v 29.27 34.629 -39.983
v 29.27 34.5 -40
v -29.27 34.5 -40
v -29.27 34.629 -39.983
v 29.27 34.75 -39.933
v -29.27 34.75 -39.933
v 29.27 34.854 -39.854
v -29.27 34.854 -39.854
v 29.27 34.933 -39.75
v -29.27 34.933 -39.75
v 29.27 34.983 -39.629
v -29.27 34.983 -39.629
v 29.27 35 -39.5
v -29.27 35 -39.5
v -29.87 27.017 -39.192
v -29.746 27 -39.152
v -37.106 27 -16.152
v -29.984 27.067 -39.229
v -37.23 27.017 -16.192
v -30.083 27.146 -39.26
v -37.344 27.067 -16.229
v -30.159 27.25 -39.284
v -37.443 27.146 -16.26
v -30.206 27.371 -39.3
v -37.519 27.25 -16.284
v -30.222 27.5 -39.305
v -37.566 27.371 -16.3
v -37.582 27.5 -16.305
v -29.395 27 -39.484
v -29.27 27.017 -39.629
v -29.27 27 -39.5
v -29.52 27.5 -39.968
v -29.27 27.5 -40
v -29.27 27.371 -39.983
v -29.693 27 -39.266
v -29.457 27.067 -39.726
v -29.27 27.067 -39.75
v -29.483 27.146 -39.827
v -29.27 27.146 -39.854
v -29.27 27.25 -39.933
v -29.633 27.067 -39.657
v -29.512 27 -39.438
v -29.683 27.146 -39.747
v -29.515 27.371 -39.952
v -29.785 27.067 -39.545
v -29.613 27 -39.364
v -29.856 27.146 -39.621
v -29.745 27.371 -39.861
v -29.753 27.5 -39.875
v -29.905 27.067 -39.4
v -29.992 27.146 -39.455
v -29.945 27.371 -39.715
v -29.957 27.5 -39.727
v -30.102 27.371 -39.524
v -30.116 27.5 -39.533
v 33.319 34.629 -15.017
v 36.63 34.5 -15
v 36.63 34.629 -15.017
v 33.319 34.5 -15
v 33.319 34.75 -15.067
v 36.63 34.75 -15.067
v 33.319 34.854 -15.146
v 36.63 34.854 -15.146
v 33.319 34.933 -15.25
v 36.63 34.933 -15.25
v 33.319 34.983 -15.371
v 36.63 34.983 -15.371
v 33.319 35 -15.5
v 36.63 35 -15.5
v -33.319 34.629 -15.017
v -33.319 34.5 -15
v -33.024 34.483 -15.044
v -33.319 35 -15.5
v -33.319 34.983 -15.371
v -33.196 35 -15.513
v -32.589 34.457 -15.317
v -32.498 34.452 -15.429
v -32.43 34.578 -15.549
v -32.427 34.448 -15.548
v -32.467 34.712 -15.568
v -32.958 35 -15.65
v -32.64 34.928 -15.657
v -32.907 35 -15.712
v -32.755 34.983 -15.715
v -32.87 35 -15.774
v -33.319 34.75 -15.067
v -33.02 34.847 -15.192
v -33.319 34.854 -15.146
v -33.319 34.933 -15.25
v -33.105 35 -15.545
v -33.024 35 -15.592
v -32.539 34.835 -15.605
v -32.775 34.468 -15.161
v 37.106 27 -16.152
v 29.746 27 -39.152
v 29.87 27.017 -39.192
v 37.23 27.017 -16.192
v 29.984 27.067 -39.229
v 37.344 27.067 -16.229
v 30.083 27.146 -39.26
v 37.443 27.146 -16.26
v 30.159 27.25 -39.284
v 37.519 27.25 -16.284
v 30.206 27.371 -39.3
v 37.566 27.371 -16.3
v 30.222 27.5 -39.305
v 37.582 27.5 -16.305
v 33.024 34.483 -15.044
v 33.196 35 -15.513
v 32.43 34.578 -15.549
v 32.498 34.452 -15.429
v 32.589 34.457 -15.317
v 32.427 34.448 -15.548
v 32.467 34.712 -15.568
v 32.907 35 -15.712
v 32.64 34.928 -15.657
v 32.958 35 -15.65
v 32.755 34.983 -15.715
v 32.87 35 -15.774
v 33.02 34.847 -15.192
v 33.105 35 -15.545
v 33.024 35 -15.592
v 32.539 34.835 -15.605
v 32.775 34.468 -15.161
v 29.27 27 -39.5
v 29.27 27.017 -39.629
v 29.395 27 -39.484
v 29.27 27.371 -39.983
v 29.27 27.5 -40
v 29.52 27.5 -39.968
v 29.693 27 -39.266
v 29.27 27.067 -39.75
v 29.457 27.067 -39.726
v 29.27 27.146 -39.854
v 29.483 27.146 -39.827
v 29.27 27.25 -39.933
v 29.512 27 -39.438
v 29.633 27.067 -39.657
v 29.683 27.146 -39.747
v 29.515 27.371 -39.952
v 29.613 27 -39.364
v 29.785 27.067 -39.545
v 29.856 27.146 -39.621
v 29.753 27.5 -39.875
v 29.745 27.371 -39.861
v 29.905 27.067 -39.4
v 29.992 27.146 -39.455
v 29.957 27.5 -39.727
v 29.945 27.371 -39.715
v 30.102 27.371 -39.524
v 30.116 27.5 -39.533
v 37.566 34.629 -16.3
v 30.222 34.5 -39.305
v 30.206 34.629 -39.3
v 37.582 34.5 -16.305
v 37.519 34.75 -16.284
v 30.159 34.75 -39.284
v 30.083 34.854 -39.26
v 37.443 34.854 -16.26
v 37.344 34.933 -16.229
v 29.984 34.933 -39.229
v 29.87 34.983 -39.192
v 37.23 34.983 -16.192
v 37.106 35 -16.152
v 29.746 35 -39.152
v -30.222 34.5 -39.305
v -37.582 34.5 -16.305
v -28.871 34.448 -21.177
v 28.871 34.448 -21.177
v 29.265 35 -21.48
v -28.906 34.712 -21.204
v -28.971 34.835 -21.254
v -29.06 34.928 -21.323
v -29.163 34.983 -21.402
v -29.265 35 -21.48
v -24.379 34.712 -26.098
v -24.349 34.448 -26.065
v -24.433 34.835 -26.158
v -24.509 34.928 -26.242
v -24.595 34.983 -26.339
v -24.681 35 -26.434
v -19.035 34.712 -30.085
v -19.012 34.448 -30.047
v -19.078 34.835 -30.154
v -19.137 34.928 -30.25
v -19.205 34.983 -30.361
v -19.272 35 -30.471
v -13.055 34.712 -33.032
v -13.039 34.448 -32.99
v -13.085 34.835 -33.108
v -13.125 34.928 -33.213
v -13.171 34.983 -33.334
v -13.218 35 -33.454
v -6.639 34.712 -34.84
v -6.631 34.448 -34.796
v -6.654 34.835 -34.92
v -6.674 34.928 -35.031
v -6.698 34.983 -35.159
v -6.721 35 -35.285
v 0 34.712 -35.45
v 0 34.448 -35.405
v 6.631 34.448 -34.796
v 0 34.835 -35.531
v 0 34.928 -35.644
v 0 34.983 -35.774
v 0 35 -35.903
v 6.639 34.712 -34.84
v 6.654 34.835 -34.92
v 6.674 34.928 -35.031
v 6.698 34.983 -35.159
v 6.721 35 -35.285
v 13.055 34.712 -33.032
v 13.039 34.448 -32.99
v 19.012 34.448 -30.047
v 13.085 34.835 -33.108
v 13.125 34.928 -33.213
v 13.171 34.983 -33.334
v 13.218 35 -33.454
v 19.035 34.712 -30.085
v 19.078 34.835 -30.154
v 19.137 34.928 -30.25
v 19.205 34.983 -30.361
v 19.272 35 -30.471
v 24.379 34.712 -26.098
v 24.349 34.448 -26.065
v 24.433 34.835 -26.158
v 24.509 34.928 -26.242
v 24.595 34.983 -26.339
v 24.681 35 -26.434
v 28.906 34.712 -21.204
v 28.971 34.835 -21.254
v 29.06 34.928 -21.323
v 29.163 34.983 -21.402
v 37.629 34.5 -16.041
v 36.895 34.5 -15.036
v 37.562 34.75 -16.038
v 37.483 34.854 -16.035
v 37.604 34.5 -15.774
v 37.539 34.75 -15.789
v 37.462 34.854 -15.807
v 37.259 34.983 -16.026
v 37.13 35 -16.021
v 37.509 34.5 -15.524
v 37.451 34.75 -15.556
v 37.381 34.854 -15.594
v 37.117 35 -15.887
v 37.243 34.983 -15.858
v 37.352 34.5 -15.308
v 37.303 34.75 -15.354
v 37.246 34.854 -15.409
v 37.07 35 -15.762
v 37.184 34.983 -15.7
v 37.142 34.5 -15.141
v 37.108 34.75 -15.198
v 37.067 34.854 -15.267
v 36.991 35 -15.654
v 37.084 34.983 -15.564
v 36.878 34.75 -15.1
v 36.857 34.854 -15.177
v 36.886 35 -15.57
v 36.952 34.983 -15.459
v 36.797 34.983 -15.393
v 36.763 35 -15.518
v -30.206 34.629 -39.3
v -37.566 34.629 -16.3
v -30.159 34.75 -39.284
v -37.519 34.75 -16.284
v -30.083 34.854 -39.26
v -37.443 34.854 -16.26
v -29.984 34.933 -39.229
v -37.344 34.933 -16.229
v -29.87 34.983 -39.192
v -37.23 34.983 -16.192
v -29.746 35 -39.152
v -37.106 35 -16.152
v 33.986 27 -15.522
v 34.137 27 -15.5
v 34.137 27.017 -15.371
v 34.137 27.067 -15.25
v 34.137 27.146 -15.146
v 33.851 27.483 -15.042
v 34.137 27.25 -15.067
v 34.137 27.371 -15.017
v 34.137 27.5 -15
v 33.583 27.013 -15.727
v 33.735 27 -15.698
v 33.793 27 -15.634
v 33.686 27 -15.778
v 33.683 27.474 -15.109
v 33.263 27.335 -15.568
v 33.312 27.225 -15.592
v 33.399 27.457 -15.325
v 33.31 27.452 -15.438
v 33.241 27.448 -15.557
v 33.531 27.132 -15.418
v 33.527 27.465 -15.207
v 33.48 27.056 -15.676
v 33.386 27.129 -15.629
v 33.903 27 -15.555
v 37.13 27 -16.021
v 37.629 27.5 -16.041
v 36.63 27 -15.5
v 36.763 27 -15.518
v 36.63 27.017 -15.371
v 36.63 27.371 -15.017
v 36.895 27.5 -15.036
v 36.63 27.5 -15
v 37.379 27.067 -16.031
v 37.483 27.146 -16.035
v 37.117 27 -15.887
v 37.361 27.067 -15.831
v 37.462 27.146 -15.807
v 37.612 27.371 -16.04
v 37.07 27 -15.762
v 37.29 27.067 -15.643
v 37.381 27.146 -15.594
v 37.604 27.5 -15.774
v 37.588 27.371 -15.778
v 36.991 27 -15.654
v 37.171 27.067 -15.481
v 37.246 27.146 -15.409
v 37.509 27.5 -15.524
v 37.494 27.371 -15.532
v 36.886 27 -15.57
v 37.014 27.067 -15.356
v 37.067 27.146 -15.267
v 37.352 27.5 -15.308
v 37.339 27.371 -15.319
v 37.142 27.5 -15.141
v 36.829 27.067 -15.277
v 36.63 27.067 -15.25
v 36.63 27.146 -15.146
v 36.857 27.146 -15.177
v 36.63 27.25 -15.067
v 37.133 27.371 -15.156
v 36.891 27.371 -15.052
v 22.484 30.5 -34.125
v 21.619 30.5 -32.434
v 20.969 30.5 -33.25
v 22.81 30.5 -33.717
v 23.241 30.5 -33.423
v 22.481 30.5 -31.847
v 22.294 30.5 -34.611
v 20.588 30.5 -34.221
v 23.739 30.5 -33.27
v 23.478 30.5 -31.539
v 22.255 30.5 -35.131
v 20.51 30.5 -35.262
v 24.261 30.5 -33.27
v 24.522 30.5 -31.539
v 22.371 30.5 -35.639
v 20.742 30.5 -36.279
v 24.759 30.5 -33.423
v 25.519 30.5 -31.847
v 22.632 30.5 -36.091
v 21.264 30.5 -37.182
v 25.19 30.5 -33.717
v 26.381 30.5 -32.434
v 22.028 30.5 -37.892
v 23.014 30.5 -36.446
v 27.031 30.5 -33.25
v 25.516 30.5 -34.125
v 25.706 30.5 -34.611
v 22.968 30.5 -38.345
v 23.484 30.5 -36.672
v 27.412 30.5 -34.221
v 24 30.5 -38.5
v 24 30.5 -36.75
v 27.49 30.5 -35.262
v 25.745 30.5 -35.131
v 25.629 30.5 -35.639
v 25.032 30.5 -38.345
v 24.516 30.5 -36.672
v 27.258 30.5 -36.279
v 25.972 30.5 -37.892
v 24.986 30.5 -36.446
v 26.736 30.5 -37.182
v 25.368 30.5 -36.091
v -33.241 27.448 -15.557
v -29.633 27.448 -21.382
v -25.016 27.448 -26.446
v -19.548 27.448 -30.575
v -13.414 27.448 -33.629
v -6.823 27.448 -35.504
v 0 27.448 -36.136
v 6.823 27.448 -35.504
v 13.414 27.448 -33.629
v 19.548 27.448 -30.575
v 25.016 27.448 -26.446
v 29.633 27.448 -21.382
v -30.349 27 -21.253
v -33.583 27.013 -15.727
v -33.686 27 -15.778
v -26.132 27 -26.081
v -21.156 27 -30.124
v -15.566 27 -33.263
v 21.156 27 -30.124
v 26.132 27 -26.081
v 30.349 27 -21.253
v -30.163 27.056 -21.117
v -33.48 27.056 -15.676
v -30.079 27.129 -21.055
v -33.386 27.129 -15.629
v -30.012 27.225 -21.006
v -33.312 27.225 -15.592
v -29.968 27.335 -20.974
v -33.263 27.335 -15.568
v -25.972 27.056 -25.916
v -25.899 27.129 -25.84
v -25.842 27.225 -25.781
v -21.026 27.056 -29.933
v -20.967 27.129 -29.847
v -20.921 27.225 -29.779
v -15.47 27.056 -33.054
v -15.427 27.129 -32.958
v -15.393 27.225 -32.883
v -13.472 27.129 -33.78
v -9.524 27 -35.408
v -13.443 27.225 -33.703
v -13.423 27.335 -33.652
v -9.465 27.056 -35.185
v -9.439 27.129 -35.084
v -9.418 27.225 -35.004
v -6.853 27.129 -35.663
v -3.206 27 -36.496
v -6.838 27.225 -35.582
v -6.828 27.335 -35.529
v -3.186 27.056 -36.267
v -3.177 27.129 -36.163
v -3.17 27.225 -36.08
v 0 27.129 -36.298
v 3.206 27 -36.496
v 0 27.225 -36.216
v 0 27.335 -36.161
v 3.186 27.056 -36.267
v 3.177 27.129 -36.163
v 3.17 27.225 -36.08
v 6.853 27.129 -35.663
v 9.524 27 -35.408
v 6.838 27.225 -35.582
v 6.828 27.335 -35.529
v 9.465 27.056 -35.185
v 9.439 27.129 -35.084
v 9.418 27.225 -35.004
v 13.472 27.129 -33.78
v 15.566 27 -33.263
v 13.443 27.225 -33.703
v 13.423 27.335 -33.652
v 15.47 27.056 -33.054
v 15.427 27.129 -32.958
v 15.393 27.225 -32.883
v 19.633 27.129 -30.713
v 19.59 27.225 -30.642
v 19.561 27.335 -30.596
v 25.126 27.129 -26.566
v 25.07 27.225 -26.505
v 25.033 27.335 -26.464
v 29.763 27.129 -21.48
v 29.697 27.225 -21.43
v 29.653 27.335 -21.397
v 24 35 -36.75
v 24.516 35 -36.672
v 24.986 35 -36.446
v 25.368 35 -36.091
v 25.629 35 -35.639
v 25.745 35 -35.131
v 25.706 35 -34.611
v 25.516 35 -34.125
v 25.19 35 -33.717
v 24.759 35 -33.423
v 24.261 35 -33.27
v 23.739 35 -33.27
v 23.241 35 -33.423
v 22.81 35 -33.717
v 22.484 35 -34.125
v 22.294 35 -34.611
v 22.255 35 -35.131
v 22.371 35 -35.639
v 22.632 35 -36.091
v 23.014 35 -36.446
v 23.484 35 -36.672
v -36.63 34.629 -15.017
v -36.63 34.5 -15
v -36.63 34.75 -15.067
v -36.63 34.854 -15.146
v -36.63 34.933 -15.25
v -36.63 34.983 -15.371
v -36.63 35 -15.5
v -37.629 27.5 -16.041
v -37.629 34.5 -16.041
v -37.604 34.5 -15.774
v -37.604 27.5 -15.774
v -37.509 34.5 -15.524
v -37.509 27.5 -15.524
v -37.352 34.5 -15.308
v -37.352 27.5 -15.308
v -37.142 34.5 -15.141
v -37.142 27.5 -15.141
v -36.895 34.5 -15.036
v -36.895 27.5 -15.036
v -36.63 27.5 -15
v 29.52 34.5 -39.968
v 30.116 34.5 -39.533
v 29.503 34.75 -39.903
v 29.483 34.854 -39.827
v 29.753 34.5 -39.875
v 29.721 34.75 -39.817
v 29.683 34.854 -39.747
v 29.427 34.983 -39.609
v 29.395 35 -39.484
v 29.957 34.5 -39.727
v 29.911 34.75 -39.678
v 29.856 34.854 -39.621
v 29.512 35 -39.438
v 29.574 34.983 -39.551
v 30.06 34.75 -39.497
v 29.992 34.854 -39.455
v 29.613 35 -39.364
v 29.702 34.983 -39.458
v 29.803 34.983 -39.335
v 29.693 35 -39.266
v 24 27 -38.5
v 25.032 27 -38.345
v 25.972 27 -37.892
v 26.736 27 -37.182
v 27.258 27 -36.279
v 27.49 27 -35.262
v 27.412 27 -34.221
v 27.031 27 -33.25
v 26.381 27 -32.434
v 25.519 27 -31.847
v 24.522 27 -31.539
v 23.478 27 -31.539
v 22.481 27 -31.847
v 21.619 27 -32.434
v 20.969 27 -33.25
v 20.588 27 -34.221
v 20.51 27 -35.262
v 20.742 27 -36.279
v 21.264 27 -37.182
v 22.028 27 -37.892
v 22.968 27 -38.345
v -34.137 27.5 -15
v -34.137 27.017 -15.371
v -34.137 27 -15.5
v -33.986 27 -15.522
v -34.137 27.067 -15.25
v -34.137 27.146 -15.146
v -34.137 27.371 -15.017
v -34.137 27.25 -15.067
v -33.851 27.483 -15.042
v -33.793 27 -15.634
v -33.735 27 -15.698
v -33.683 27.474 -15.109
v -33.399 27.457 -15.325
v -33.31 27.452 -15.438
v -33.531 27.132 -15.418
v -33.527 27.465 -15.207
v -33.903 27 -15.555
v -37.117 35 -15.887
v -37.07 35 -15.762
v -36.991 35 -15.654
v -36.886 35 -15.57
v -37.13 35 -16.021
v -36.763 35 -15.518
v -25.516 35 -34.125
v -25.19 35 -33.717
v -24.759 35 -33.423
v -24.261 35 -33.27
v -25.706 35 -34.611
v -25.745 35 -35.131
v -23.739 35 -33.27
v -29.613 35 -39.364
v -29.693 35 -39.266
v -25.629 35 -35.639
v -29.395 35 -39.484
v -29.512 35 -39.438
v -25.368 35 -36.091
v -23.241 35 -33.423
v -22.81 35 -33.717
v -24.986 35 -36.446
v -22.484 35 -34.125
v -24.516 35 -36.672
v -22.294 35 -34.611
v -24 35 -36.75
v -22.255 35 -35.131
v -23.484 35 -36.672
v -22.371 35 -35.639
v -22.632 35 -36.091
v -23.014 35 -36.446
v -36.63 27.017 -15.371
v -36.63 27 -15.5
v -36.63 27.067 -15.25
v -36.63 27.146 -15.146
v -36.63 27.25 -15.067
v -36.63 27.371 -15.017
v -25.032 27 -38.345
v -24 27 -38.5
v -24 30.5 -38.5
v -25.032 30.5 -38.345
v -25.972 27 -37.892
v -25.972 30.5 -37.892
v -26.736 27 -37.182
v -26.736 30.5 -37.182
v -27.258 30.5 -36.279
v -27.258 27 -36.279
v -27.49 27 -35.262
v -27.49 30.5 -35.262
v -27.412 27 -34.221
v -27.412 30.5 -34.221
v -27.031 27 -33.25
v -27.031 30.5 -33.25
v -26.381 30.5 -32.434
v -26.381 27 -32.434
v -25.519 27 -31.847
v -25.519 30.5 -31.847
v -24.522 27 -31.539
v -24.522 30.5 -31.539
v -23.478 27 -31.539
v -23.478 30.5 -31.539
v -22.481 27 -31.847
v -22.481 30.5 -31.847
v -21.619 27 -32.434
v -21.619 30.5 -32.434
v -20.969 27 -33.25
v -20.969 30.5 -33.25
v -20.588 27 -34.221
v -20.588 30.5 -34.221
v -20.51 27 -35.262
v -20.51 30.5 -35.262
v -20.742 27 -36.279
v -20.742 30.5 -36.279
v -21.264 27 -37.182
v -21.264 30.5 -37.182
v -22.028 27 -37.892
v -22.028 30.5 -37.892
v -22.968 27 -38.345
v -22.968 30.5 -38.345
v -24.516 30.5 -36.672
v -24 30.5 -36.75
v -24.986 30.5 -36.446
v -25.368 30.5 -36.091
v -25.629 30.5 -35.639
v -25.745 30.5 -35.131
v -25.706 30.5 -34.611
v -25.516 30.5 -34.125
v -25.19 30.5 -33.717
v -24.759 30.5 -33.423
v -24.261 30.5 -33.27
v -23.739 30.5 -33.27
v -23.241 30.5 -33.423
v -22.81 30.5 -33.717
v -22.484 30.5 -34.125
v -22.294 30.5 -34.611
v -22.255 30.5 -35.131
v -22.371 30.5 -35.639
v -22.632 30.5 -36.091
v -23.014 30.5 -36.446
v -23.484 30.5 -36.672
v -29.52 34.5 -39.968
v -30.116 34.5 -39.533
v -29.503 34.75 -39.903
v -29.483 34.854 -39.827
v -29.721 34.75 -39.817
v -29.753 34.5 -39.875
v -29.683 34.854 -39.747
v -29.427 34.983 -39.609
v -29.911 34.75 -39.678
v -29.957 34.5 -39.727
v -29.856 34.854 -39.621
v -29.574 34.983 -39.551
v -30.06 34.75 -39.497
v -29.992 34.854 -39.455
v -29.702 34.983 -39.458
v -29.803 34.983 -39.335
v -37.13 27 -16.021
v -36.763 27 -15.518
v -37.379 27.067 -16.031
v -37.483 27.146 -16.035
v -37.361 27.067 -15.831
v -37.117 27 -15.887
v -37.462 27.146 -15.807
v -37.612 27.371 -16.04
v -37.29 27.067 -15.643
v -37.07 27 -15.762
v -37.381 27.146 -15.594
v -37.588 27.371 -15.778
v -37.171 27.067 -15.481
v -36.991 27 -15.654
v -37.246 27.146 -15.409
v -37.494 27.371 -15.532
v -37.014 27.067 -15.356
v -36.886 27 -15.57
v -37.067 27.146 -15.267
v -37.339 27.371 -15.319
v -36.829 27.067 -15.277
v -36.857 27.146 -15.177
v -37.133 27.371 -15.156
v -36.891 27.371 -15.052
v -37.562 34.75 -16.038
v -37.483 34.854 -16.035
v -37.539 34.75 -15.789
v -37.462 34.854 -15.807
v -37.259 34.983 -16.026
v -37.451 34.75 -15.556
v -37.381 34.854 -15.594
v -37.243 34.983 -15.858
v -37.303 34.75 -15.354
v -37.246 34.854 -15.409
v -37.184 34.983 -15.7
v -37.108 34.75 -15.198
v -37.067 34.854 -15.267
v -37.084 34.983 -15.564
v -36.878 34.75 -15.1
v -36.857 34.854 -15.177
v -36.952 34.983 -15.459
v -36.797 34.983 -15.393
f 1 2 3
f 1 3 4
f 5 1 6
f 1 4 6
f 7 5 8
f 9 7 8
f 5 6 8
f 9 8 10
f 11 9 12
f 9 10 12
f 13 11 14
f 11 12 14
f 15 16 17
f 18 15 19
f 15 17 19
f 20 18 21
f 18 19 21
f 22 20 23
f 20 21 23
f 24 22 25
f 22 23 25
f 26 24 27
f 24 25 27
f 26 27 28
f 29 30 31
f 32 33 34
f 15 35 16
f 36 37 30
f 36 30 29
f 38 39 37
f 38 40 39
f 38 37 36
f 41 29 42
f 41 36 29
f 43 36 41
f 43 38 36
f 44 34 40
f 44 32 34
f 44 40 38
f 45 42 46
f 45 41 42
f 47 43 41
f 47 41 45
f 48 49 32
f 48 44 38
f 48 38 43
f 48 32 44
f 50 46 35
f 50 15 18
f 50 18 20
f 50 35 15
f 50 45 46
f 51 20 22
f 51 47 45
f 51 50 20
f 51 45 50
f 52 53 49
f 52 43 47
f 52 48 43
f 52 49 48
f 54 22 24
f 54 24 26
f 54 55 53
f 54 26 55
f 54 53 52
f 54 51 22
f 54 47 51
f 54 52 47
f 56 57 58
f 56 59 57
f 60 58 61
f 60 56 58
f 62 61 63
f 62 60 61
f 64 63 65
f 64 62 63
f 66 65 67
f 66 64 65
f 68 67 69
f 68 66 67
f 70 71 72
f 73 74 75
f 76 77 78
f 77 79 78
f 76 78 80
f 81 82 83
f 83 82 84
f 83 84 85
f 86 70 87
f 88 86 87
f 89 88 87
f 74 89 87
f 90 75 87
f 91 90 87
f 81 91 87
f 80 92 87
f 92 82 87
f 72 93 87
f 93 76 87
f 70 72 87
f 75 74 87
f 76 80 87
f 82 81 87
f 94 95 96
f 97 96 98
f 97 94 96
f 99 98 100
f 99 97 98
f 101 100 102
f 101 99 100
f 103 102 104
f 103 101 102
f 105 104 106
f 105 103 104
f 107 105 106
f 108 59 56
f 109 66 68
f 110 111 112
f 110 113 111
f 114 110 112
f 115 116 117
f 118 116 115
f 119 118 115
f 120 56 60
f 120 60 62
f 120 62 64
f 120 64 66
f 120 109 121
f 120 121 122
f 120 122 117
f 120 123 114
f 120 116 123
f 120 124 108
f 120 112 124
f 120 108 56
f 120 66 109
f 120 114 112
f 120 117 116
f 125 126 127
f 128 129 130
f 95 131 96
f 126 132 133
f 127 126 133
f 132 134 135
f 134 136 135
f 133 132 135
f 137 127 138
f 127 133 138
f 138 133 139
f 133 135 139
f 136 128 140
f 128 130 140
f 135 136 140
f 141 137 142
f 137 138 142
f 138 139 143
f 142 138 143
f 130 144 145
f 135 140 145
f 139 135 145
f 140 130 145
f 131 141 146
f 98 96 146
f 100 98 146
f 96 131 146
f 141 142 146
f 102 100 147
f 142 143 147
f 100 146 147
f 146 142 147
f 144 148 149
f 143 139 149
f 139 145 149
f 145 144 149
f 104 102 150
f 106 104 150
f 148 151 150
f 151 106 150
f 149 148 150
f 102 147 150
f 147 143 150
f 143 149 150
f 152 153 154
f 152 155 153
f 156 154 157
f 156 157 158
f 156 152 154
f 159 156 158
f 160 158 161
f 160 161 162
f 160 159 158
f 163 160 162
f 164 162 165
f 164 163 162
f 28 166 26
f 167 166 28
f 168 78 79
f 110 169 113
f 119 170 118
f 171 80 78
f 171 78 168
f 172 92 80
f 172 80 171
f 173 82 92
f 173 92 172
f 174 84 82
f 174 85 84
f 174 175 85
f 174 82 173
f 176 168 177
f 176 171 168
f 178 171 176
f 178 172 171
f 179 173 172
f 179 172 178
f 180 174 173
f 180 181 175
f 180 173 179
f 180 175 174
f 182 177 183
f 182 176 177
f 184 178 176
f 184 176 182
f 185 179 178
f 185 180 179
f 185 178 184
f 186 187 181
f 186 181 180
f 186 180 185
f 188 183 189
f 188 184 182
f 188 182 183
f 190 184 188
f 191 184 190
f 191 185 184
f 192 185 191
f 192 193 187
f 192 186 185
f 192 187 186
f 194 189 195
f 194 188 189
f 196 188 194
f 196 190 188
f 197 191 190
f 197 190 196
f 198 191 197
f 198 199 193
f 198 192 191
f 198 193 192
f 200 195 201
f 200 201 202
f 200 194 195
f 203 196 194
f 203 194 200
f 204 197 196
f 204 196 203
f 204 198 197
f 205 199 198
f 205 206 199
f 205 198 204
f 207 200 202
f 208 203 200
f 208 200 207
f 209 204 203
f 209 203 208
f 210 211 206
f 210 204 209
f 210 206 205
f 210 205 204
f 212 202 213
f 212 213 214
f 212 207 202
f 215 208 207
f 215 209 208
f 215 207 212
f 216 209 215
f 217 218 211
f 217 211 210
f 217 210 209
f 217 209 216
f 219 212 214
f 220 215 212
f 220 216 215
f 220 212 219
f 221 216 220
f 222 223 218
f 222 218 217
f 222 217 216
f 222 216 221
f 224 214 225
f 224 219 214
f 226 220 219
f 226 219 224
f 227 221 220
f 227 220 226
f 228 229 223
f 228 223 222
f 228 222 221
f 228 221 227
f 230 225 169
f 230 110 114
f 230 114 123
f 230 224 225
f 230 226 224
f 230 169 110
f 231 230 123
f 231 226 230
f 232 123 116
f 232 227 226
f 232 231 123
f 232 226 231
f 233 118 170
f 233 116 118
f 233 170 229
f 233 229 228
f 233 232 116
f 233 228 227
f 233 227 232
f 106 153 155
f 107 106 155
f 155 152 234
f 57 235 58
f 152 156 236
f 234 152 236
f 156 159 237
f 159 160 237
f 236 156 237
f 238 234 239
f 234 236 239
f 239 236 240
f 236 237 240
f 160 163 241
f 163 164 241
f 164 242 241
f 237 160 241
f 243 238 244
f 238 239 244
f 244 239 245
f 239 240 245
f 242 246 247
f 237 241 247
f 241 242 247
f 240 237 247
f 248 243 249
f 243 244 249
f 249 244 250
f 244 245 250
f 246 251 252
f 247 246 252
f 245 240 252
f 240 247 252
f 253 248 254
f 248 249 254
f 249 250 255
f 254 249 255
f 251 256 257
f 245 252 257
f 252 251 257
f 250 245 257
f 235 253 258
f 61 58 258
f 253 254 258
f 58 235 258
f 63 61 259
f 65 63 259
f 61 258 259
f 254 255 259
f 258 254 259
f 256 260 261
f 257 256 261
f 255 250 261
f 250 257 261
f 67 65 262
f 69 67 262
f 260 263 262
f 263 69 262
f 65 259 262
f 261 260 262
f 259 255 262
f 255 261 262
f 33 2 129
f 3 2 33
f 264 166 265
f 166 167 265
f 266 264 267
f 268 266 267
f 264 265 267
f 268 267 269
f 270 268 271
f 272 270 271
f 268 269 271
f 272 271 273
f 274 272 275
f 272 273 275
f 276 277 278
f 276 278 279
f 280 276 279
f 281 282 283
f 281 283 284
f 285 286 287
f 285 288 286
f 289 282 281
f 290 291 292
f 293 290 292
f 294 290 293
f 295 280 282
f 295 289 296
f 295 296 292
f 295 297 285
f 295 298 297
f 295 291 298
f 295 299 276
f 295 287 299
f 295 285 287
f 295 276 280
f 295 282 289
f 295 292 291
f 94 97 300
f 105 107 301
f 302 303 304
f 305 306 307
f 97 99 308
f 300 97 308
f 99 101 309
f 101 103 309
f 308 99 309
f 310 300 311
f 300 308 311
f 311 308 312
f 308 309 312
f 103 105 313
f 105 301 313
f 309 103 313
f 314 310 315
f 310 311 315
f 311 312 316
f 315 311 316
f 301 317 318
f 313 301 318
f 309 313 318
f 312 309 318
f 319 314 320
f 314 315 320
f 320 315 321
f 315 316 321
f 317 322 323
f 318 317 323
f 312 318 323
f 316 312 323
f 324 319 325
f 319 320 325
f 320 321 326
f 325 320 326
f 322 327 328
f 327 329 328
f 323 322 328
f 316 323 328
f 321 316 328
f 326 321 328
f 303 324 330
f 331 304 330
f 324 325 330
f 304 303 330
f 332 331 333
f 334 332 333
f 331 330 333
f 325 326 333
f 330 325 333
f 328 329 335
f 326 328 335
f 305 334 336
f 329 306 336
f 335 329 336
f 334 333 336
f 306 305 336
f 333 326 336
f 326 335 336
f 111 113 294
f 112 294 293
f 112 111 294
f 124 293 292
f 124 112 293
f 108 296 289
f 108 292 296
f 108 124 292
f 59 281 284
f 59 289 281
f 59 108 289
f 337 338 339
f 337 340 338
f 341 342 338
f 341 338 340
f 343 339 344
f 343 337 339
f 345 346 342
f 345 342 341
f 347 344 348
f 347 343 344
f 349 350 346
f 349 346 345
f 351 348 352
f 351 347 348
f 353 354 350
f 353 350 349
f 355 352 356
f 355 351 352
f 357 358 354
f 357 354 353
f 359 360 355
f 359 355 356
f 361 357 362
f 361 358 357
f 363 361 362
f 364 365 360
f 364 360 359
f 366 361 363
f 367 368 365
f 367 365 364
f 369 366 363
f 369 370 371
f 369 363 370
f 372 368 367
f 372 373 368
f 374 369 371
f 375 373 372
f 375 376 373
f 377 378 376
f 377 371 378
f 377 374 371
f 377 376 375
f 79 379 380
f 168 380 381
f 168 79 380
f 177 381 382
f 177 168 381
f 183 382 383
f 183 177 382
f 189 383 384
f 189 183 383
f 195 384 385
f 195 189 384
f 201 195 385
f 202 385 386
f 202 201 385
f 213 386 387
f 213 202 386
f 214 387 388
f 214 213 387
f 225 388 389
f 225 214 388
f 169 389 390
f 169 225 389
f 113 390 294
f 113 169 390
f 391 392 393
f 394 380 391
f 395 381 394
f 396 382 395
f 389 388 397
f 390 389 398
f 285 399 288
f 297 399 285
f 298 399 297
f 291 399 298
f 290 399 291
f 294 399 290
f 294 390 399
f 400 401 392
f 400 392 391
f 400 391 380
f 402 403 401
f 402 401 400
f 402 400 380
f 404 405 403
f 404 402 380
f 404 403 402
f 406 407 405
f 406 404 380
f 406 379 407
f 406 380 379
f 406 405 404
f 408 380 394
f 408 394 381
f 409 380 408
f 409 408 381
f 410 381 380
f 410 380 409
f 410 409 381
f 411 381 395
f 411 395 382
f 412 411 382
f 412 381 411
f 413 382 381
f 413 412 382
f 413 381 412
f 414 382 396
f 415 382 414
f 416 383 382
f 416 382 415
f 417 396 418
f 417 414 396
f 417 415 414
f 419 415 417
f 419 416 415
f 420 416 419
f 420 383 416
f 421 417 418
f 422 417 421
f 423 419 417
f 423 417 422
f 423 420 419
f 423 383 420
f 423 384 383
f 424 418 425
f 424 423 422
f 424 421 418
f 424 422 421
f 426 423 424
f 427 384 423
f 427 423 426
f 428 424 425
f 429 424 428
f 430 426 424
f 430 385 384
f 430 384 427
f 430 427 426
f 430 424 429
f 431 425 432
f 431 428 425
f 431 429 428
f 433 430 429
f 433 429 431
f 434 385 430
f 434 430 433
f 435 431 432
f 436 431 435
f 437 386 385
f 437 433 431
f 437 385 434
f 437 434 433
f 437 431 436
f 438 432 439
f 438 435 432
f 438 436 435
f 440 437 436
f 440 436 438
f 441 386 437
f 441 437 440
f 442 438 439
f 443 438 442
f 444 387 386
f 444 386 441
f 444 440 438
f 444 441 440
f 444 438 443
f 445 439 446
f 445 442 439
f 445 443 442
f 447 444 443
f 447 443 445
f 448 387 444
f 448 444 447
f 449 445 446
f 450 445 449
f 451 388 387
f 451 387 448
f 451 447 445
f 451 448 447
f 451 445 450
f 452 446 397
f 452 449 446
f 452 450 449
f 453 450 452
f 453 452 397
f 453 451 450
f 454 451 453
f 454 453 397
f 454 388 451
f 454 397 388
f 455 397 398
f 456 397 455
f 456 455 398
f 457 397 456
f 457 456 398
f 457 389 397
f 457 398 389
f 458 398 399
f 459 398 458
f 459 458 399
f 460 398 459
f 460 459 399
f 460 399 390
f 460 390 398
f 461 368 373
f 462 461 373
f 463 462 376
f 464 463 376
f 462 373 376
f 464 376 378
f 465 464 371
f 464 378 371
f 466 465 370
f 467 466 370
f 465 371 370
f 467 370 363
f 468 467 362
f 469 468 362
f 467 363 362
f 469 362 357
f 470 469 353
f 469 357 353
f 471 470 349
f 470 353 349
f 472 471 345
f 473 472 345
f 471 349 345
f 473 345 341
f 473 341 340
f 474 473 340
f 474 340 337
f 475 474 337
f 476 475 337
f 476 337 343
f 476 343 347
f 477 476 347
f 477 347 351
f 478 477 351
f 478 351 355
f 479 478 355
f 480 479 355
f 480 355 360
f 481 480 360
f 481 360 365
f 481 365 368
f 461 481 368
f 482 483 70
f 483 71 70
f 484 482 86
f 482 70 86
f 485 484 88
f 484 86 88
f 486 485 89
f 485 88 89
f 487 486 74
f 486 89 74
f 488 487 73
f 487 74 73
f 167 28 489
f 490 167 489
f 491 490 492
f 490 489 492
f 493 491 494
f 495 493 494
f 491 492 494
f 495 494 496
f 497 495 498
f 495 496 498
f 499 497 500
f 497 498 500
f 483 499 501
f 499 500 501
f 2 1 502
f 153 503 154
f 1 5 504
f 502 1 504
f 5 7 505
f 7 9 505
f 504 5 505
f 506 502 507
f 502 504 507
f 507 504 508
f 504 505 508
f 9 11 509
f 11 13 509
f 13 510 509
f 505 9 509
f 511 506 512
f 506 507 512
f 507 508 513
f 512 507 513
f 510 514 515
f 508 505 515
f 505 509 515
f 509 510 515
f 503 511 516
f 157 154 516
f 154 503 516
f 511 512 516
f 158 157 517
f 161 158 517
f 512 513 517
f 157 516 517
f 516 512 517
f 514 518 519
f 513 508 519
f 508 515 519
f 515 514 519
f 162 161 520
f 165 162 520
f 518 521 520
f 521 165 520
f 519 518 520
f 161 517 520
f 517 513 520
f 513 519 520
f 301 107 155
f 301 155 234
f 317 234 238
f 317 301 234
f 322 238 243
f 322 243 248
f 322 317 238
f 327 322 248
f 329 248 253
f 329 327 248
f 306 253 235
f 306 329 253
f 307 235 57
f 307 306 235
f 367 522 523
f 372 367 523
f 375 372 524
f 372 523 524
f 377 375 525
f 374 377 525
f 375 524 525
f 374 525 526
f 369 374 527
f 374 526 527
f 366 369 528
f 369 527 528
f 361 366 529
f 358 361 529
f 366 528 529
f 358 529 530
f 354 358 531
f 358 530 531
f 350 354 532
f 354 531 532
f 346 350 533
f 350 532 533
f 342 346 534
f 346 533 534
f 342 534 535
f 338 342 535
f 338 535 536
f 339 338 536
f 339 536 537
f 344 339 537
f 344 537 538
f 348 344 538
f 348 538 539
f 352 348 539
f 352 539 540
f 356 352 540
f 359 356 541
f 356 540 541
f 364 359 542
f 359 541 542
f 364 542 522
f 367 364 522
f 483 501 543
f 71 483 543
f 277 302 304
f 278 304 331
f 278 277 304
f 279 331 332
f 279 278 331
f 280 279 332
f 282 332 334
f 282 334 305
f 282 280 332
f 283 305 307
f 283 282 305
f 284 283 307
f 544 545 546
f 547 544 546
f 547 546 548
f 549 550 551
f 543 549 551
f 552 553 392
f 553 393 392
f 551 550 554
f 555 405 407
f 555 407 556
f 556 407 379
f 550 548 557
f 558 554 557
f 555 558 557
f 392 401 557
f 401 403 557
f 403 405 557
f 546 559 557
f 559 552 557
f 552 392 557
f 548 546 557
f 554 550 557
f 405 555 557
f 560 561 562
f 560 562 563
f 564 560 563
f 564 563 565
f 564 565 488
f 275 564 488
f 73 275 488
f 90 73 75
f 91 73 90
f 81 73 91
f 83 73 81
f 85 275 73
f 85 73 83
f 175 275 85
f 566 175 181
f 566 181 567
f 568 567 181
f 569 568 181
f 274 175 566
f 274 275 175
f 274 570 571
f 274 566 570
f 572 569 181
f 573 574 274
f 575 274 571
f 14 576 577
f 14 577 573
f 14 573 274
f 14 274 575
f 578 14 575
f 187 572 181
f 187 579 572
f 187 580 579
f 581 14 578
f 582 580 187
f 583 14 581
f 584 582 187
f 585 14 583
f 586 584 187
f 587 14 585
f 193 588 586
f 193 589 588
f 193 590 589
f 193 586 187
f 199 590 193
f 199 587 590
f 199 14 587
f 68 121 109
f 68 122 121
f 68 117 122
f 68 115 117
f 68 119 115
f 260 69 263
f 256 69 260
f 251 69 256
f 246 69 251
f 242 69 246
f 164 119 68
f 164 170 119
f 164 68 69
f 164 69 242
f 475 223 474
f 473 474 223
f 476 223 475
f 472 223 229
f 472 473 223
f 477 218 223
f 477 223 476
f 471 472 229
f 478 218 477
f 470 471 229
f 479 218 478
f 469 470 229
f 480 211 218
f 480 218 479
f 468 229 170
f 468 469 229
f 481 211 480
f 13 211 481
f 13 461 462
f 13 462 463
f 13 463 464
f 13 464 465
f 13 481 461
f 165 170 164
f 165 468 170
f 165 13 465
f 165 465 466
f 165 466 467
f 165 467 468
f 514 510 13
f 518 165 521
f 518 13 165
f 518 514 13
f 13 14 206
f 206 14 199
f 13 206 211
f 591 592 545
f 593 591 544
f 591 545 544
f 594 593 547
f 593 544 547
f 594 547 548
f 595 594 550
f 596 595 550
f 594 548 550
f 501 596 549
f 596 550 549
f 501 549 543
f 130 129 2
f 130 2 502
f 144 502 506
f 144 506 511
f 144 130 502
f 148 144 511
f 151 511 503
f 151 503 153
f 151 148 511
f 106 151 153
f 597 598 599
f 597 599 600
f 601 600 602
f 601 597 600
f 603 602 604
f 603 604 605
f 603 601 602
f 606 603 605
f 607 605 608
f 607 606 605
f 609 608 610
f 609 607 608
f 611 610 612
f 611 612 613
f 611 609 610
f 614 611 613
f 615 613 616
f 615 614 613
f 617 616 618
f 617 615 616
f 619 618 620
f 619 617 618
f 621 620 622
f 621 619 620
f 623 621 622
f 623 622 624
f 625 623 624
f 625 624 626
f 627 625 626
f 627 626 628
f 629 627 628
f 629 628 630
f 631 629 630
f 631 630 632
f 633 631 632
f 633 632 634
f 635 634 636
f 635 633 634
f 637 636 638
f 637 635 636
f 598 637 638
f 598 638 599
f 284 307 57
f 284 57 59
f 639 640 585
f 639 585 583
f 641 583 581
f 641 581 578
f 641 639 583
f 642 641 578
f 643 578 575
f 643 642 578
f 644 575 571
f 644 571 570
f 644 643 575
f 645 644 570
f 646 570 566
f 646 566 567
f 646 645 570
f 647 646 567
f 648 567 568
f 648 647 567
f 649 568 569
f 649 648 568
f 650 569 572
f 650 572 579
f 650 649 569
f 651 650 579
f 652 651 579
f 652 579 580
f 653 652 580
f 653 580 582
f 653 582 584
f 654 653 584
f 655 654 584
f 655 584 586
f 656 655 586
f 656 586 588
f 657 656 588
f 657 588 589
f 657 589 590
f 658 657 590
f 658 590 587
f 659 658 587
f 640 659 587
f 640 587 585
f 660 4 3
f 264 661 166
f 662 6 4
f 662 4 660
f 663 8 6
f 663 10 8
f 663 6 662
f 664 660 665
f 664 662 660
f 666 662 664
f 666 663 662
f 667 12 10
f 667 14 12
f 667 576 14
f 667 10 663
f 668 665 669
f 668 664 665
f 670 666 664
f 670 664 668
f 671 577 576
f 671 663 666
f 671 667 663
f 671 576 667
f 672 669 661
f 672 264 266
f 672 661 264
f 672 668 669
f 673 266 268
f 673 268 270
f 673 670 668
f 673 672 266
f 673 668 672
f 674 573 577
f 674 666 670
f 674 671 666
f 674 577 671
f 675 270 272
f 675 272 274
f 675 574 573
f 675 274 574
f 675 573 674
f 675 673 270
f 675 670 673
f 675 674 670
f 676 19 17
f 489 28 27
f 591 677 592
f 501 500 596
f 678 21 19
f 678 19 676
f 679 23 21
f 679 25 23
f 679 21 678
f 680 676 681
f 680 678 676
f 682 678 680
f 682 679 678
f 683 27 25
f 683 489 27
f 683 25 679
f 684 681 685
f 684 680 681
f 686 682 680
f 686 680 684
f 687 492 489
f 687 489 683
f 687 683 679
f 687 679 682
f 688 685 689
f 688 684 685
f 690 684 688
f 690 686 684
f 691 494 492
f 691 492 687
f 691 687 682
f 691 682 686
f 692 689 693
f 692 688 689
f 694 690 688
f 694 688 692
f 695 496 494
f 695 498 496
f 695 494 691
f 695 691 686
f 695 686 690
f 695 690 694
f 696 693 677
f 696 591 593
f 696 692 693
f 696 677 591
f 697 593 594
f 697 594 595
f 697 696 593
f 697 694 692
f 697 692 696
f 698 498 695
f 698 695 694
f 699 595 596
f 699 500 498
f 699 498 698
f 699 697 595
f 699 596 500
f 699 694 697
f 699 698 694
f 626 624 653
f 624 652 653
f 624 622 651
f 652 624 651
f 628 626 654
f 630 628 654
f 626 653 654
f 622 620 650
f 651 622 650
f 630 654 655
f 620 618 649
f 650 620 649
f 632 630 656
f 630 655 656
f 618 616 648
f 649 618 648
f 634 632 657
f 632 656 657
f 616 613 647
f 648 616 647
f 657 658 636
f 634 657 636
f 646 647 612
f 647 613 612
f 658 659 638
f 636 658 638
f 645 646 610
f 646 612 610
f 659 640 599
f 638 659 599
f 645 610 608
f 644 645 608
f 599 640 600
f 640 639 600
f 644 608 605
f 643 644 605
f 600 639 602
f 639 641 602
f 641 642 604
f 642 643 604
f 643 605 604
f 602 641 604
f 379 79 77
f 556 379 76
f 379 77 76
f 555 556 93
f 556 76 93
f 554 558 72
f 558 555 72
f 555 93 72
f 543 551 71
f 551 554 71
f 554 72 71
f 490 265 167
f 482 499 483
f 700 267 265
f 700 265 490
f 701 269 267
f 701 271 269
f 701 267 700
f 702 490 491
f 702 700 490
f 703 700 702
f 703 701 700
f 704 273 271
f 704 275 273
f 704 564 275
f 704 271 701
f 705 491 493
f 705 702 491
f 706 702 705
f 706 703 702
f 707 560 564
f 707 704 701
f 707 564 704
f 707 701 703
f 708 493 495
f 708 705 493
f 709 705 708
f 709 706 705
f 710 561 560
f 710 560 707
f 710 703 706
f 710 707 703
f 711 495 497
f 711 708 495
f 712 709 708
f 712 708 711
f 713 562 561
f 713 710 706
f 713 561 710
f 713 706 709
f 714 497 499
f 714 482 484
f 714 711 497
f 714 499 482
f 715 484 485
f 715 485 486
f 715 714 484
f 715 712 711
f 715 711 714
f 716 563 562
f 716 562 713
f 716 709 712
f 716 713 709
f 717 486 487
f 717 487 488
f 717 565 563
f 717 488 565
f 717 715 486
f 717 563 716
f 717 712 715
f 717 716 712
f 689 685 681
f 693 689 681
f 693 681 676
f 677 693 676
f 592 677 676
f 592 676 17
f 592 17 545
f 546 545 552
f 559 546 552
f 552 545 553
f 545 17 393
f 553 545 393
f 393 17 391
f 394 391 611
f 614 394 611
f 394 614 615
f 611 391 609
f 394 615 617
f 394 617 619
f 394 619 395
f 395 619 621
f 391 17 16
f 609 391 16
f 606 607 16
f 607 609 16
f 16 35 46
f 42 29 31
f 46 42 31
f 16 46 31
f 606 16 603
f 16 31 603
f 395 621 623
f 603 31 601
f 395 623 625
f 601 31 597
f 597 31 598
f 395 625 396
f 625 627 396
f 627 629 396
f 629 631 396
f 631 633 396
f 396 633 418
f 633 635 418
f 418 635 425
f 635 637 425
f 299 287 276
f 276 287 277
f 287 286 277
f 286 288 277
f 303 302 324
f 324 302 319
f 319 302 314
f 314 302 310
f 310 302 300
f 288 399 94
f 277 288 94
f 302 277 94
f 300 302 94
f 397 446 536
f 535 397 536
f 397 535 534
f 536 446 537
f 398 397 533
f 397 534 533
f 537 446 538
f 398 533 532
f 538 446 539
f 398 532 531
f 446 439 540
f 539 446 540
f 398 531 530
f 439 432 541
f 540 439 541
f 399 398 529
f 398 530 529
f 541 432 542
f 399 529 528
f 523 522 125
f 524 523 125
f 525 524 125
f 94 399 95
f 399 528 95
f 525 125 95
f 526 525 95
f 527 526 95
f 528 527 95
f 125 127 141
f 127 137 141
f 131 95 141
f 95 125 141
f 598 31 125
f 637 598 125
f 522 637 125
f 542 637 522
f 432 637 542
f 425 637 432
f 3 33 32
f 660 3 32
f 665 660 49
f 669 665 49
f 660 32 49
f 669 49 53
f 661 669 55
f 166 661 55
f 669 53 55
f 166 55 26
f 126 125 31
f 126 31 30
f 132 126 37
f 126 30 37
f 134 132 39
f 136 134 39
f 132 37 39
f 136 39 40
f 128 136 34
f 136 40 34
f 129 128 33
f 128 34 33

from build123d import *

# Parameters (mm, degrees)
BOSS_EXTRU_1_START      = 35
BOSS_EXTRU_1_DEPTH      = 8
CONG_1_R                = 1
ESQUISSE3_R             = 1.75
ENL_V_MAT_EXTRU_1_DEPTH = 56.497932403
ESQUISSE4_R             = 3.5
ENL_V_MAT_EXTRU_2_DEPTH = 3.5
CONG_2_R                = 0.5


with BuildPart() as part:
    # Esquisse1 → Boss.-Extru.1 (new body)
    with BuildSketch(Plane(origin=(0, 0, 0), x_dir=(1, 0, 0), z_dir=(0, 1, 0)).offset(BOSS_EXTRU_1_START)):
        Polygon((0, 40), (30, 40), (38, 15), (0, 15), align=None)
    extrude(amount=-BOSS_EXTRU_1_DEPTH)

    # Esquisse2 → Enlèvement de matière-Révolution1 (revolve, cut)
    with BuildSketch(Plane(origin=(0, 0, 0), x_dir=(0, 0, -1), z_dir=(1, 0, 0))):
        Polygon((39, 0), (27, 115), (-1, 115), (-1, 0), align=None)
    revolve(axis=Axis((0, 115, 1), (0, 1, 0)), mode=Mode.SUBTRACT)

    # Congé1
    cong_1_edges = [part.edges().sort_by_distance(p)[0] for p in [
        (33.101067508, 31.000070332, -15),
        (30, 31, -40),
        (38, 31, -15),
    ]]
    fillet(cong_1_edges, radius=CONG_1_R)

    # Esquisse3 → Enlèv. mat.-Extru.1 (cut, through all)
    with BuildSketch(Plane.XZ.offset(-27)):
        with Locations(Location((24, -35, 0), (0, 0, 270))):
            Circle(ESQUISSE3_R)
    extrude(amount=-ENL_V_MAT_EXTRU_1_DEPTH, mode=Mode.SUBTRACT)

    # Esquisse4 → Enlèv. mat.-Extru.2 (cut)
    with BuildSketch(Plane.XZ.offset(-27)):
        with Locations(Location((24, -35, 0), (0, 0, 270))):
            Circle(ESQUISSE4_R)
    extrude(amount=-ENL_V_MAT_EXTRU_2_DEPTH, mode=Mode.SUBTRACT)

    # Congé2
    cong_2_edges = [part.edges().sort_by_distance(p)[0] for p in [
        (37.437752927, 27, -15.410413589),
        (33.902471767, 27, -27.804775727),
        (29.859634031, 27, -39.807705307),
        (33.664775152, 27, -15.150178589),
        (14.63502381, 35, -40),
        (29.859634031, 35, -39.807705307),
        (33.902471767, 35, -27.804775727),
        (37.437752927, 35, -15.410413589),
        (34.945309997, 35, -15),
        (32.73463145, 35, -15.147278852),
        (14.63502381, 27, -40),
        (19.582003838, 27, -30.60840893),
        (18.969834976, 35, -30.00499673),
        (35.412730047, 27, -15),
    ]]
    fillet(cong_2_edges, radius=CONG_2_R)

    # Symétrie1: part across plane


with BuildPart() as part_1:
    add(part.part)
    add(part.part.mirror(Plane(origin=(0, 27, -40), x_dir=(0, 0, 1), z_dir=(-1, 0, 0))))


solid = part_1.part
